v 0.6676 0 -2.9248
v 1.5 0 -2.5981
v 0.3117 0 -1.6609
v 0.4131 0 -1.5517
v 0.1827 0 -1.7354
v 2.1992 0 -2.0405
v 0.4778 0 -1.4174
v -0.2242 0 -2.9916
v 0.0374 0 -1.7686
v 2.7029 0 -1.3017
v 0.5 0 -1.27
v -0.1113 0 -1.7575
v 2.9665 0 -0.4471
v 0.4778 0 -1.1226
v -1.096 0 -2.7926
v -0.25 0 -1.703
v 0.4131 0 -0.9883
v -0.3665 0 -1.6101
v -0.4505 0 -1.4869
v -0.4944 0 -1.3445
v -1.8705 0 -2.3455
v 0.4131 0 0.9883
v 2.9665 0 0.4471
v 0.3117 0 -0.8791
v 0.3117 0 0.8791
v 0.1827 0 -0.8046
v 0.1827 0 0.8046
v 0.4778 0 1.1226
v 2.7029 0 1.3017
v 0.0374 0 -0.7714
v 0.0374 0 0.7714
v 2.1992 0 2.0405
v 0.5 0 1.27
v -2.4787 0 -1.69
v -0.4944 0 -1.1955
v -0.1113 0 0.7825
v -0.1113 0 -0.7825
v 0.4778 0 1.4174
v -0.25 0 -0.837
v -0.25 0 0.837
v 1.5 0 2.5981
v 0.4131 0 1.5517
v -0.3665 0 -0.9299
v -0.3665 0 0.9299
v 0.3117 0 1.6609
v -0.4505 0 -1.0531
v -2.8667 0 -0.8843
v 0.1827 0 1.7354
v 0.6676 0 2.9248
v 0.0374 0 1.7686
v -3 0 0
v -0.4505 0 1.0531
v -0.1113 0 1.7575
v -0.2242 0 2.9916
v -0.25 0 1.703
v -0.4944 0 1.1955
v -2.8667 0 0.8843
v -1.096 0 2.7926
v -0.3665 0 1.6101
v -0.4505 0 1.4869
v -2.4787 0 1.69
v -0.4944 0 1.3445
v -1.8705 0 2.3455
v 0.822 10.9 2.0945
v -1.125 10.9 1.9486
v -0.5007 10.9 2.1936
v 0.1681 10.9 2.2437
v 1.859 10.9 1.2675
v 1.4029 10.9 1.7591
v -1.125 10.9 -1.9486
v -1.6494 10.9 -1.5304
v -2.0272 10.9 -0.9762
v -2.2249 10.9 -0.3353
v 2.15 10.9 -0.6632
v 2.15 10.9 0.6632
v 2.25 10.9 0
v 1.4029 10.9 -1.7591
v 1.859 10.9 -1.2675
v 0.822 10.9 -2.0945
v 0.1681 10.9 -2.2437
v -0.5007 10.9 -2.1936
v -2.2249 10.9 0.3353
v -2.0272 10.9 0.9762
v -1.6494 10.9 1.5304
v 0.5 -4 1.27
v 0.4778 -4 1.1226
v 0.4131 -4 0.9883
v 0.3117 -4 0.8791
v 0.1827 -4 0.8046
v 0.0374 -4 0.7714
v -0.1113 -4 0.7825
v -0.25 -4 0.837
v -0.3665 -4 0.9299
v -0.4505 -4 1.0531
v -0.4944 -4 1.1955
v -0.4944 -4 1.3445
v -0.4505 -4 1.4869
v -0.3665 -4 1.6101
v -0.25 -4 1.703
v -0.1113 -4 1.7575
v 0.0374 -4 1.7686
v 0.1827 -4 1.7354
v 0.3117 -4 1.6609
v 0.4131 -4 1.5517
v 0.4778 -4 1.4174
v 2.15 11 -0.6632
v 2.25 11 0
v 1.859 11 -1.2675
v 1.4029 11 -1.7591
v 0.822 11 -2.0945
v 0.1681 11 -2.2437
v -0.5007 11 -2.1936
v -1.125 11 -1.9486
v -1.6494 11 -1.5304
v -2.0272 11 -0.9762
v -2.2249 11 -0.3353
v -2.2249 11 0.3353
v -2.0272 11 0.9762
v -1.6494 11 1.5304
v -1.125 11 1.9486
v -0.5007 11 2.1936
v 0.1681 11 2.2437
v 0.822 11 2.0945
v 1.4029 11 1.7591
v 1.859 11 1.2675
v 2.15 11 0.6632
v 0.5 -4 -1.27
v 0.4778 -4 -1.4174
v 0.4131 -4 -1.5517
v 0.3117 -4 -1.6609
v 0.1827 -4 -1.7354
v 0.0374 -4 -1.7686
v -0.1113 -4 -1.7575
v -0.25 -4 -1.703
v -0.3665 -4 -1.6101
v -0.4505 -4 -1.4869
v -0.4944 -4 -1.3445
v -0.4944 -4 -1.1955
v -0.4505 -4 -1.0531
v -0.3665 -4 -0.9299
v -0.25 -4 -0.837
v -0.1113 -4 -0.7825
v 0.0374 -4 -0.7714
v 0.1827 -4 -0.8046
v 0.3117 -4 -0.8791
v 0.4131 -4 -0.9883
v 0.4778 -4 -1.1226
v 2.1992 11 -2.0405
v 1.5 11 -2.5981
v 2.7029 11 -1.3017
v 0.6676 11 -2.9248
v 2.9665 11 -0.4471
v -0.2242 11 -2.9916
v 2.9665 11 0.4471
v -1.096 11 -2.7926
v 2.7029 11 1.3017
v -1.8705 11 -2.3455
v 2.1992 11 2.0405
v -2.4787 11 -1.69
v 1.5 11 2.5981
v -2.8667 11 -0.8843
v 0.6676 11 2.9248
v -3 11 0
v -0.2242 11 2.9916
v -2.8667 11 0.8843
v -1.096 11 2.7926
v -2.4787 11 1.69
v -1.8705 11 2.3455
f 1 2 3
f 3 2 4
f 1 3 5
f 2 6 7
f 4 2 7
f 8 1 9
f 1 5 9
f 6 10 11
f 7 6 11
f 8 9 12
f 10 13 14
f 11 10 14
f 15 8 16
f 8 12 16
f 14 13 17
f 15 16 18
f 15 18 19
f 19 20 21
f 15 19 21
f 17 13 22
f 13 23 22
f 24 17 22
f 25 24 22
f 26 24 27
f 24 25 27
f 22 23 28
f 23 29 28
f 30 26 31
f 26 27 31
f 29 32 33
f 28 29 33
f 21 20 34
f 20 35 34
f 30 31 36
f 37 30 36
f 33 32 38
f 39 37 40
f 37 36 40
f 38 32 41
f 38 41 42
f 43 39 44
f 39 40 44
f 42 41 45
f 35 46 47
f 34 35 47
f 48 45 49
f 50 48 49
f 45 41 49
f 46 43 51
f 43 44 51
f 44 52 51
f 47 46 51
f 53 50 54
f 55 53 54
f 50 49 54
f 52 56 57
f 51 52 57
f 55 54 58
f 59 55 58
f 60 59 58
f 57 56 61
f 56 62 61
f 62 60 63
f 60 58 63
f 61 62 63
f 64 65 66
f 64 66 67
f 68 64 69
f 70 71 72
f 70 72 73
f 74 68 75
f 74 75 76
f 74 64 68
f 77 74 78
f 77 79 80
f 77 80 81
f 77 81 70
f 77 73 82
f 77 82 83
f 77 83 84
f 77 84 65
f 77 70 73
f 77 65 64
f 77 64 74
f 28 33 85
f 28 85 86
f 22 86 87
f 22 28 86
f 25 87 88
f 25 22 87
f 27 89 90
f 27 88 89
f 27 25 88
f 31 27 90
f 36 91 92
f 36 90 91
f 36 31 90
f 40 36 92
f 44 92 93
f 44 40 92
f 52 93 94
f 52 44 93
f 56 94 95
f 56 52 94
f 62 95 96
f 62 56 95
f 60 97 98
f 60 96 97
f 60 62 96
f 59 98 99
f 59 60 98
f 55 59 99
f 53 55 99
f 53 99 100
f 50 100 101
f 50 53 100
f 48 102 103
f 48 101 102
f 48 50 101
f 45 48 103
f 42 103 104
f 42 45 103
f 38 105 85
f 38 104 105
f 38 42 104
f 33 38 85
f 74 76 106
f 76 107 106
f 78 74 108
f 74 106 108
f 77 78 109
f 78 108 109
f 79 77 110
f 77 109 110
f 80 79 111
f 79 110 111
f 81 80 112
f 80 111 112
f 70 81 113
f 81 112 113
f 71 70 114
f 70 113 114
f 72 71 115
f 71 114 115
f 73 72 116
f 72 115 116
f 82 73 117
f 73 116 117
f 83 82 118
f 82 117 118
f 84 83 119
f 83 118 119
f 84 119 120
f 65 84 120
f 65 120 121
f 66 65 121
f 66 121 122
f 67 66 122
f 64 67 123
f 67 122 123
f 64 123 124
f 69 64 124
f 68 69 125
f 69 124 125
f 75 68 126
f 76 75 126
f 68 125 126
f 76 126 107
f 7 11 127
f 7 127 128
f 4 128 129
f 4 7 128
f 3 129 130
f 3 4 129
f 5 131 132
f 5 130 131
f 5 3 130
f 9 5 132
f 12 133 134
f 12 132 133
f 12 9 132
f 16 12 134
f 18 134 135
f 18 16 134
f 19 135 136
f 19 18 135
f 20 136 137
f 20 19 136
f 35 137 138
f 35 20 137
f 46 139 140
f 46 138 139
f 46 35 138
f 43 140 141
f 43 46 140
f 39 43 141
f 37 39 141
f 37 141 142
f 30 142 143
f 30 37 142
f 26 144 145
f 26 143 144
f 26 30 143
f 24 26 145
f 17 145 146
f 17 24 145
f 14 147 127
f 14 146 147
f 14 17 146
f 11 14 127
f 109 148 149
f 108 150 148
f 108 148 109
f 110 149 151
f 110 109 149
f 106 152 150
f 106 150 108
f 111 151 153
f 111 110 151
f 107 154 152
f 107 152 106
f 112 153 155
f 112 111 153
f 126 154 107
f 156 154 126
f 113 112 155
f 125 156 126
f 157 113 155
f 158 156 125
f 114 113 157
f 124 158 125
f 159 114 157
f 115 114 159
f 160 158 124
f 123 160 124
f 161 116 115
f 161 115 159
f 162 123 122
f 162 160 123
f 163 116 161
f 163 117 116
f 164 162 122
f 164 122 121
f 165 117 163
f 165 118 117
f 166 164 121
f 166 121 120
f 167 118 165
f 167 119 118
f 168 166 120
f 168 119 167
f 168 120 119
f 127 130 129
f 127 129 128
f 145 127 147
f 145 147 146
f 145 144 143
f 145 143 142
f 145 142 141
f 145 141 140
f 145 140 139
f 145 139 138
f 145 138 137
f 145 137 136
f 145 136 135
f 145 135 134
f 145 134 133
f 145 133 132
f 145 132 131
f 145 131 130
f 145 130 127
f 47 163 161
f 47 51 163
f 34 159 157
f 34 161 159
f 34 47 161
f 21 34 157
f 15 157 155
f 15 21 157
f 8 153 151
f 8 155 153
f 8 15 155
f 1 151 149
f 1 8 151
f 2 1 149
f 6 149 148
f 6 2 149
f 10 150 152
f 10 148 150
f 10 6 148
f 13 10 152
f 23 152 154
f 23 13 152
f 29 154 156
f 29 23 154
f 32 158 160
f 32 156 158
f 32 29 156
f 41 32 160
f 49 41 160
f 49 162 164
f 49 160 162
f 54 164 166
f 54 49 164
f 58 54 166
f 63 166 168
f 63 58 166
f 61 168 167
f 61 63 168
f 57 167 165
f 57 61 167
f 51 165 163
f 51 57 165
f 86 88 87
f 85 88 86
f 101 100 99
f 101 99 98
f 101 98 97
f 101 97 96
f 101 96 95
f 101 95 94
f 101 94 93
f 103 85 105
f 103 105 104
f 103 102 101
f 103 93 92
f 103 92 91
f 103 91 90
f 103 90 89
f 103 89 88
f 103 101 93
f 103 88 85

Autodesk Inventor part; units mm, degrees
sketch "Skizze3" plane through (0, 0, 0) normal (0, 1, 0) x (-1, 0, 0)
  circle A0 centre (0, 0) radius 3
  dimension "Durchmesser" = 6
extrude "Extrusion2" add sketch "Skizze3" along normal blind 11
sketch "Skizze4" plane through (0, 0, 0) normal (0, -1, 0) x (1, 0, 0)
  circle A0 centre (0, 1.27) radius 0.5
  circle A1 centre (0, -1.27) radius 0.5
  point P0 (0, 0)
  dimension "d6" = 1
  dimension "d7" = 1
  dimension "BeinAbstand" = 2.54
  dimension "BeinZuMitte" = 1.27
extrude "Extrusion3" add sketch "Skizze4" along normal blind 4
ref_plane "Arbeitsebene1" through (-1.5, 0, 0) normal (1, 0, 0) x (0, 1, 0)
ref_plane "Arbeitsebene2" through (1.5, 0, 0) normal (1, 0, 0) x (0, 1, 0)
split_face "Trennen1"
split_face "Trennen2"
ref_plane "Arbeitsebene3" through (-0.5, 0, 0) normal (1, 0, 0) x (0, 1, 0)
ref_plane "Arbeitsebene4" through (0.5, 0, 0) normal (1, 0, 0) x (0, 1, 0)
ref_plane "Arbeitsebene5" through (0, 9, 0) normal (0, 1, 0) x (1, 0, 0)
ref_plane "Arbeitsebene6" through (0, 6.5, 0) normal (0, 1, 0) x (1, 0, 0)
sketch "Skizze5" plane through (0, 11, 0) normal (0, 1, 0) x (1, 0, 0)
  circle A0 centre (0, 0) radius 2.25
  dimension "d21" = 4.5
extrude "Extrusion4" cut sketch "Skizze5" against normal blind 0.1
split_face "Trennen3"
split_face "Trennen4"
split_face "Trennen7"
split_face "Trennen8"
ref_plane "Arbeitsebene9" through (0, 3.5, 0) normal (0, -1, 0) x (1, 0, 0)
ref_plane "Arbeitsebene10" through (0, 1, 0) normal (0, -1, 0) x (1, 0, 0)
split_face "Trennen9"
split_face "Trennen10"
equation "\"BeinZuMitte\" = 0.5 * BeinAbstand"
properties part number "Kondensator"
